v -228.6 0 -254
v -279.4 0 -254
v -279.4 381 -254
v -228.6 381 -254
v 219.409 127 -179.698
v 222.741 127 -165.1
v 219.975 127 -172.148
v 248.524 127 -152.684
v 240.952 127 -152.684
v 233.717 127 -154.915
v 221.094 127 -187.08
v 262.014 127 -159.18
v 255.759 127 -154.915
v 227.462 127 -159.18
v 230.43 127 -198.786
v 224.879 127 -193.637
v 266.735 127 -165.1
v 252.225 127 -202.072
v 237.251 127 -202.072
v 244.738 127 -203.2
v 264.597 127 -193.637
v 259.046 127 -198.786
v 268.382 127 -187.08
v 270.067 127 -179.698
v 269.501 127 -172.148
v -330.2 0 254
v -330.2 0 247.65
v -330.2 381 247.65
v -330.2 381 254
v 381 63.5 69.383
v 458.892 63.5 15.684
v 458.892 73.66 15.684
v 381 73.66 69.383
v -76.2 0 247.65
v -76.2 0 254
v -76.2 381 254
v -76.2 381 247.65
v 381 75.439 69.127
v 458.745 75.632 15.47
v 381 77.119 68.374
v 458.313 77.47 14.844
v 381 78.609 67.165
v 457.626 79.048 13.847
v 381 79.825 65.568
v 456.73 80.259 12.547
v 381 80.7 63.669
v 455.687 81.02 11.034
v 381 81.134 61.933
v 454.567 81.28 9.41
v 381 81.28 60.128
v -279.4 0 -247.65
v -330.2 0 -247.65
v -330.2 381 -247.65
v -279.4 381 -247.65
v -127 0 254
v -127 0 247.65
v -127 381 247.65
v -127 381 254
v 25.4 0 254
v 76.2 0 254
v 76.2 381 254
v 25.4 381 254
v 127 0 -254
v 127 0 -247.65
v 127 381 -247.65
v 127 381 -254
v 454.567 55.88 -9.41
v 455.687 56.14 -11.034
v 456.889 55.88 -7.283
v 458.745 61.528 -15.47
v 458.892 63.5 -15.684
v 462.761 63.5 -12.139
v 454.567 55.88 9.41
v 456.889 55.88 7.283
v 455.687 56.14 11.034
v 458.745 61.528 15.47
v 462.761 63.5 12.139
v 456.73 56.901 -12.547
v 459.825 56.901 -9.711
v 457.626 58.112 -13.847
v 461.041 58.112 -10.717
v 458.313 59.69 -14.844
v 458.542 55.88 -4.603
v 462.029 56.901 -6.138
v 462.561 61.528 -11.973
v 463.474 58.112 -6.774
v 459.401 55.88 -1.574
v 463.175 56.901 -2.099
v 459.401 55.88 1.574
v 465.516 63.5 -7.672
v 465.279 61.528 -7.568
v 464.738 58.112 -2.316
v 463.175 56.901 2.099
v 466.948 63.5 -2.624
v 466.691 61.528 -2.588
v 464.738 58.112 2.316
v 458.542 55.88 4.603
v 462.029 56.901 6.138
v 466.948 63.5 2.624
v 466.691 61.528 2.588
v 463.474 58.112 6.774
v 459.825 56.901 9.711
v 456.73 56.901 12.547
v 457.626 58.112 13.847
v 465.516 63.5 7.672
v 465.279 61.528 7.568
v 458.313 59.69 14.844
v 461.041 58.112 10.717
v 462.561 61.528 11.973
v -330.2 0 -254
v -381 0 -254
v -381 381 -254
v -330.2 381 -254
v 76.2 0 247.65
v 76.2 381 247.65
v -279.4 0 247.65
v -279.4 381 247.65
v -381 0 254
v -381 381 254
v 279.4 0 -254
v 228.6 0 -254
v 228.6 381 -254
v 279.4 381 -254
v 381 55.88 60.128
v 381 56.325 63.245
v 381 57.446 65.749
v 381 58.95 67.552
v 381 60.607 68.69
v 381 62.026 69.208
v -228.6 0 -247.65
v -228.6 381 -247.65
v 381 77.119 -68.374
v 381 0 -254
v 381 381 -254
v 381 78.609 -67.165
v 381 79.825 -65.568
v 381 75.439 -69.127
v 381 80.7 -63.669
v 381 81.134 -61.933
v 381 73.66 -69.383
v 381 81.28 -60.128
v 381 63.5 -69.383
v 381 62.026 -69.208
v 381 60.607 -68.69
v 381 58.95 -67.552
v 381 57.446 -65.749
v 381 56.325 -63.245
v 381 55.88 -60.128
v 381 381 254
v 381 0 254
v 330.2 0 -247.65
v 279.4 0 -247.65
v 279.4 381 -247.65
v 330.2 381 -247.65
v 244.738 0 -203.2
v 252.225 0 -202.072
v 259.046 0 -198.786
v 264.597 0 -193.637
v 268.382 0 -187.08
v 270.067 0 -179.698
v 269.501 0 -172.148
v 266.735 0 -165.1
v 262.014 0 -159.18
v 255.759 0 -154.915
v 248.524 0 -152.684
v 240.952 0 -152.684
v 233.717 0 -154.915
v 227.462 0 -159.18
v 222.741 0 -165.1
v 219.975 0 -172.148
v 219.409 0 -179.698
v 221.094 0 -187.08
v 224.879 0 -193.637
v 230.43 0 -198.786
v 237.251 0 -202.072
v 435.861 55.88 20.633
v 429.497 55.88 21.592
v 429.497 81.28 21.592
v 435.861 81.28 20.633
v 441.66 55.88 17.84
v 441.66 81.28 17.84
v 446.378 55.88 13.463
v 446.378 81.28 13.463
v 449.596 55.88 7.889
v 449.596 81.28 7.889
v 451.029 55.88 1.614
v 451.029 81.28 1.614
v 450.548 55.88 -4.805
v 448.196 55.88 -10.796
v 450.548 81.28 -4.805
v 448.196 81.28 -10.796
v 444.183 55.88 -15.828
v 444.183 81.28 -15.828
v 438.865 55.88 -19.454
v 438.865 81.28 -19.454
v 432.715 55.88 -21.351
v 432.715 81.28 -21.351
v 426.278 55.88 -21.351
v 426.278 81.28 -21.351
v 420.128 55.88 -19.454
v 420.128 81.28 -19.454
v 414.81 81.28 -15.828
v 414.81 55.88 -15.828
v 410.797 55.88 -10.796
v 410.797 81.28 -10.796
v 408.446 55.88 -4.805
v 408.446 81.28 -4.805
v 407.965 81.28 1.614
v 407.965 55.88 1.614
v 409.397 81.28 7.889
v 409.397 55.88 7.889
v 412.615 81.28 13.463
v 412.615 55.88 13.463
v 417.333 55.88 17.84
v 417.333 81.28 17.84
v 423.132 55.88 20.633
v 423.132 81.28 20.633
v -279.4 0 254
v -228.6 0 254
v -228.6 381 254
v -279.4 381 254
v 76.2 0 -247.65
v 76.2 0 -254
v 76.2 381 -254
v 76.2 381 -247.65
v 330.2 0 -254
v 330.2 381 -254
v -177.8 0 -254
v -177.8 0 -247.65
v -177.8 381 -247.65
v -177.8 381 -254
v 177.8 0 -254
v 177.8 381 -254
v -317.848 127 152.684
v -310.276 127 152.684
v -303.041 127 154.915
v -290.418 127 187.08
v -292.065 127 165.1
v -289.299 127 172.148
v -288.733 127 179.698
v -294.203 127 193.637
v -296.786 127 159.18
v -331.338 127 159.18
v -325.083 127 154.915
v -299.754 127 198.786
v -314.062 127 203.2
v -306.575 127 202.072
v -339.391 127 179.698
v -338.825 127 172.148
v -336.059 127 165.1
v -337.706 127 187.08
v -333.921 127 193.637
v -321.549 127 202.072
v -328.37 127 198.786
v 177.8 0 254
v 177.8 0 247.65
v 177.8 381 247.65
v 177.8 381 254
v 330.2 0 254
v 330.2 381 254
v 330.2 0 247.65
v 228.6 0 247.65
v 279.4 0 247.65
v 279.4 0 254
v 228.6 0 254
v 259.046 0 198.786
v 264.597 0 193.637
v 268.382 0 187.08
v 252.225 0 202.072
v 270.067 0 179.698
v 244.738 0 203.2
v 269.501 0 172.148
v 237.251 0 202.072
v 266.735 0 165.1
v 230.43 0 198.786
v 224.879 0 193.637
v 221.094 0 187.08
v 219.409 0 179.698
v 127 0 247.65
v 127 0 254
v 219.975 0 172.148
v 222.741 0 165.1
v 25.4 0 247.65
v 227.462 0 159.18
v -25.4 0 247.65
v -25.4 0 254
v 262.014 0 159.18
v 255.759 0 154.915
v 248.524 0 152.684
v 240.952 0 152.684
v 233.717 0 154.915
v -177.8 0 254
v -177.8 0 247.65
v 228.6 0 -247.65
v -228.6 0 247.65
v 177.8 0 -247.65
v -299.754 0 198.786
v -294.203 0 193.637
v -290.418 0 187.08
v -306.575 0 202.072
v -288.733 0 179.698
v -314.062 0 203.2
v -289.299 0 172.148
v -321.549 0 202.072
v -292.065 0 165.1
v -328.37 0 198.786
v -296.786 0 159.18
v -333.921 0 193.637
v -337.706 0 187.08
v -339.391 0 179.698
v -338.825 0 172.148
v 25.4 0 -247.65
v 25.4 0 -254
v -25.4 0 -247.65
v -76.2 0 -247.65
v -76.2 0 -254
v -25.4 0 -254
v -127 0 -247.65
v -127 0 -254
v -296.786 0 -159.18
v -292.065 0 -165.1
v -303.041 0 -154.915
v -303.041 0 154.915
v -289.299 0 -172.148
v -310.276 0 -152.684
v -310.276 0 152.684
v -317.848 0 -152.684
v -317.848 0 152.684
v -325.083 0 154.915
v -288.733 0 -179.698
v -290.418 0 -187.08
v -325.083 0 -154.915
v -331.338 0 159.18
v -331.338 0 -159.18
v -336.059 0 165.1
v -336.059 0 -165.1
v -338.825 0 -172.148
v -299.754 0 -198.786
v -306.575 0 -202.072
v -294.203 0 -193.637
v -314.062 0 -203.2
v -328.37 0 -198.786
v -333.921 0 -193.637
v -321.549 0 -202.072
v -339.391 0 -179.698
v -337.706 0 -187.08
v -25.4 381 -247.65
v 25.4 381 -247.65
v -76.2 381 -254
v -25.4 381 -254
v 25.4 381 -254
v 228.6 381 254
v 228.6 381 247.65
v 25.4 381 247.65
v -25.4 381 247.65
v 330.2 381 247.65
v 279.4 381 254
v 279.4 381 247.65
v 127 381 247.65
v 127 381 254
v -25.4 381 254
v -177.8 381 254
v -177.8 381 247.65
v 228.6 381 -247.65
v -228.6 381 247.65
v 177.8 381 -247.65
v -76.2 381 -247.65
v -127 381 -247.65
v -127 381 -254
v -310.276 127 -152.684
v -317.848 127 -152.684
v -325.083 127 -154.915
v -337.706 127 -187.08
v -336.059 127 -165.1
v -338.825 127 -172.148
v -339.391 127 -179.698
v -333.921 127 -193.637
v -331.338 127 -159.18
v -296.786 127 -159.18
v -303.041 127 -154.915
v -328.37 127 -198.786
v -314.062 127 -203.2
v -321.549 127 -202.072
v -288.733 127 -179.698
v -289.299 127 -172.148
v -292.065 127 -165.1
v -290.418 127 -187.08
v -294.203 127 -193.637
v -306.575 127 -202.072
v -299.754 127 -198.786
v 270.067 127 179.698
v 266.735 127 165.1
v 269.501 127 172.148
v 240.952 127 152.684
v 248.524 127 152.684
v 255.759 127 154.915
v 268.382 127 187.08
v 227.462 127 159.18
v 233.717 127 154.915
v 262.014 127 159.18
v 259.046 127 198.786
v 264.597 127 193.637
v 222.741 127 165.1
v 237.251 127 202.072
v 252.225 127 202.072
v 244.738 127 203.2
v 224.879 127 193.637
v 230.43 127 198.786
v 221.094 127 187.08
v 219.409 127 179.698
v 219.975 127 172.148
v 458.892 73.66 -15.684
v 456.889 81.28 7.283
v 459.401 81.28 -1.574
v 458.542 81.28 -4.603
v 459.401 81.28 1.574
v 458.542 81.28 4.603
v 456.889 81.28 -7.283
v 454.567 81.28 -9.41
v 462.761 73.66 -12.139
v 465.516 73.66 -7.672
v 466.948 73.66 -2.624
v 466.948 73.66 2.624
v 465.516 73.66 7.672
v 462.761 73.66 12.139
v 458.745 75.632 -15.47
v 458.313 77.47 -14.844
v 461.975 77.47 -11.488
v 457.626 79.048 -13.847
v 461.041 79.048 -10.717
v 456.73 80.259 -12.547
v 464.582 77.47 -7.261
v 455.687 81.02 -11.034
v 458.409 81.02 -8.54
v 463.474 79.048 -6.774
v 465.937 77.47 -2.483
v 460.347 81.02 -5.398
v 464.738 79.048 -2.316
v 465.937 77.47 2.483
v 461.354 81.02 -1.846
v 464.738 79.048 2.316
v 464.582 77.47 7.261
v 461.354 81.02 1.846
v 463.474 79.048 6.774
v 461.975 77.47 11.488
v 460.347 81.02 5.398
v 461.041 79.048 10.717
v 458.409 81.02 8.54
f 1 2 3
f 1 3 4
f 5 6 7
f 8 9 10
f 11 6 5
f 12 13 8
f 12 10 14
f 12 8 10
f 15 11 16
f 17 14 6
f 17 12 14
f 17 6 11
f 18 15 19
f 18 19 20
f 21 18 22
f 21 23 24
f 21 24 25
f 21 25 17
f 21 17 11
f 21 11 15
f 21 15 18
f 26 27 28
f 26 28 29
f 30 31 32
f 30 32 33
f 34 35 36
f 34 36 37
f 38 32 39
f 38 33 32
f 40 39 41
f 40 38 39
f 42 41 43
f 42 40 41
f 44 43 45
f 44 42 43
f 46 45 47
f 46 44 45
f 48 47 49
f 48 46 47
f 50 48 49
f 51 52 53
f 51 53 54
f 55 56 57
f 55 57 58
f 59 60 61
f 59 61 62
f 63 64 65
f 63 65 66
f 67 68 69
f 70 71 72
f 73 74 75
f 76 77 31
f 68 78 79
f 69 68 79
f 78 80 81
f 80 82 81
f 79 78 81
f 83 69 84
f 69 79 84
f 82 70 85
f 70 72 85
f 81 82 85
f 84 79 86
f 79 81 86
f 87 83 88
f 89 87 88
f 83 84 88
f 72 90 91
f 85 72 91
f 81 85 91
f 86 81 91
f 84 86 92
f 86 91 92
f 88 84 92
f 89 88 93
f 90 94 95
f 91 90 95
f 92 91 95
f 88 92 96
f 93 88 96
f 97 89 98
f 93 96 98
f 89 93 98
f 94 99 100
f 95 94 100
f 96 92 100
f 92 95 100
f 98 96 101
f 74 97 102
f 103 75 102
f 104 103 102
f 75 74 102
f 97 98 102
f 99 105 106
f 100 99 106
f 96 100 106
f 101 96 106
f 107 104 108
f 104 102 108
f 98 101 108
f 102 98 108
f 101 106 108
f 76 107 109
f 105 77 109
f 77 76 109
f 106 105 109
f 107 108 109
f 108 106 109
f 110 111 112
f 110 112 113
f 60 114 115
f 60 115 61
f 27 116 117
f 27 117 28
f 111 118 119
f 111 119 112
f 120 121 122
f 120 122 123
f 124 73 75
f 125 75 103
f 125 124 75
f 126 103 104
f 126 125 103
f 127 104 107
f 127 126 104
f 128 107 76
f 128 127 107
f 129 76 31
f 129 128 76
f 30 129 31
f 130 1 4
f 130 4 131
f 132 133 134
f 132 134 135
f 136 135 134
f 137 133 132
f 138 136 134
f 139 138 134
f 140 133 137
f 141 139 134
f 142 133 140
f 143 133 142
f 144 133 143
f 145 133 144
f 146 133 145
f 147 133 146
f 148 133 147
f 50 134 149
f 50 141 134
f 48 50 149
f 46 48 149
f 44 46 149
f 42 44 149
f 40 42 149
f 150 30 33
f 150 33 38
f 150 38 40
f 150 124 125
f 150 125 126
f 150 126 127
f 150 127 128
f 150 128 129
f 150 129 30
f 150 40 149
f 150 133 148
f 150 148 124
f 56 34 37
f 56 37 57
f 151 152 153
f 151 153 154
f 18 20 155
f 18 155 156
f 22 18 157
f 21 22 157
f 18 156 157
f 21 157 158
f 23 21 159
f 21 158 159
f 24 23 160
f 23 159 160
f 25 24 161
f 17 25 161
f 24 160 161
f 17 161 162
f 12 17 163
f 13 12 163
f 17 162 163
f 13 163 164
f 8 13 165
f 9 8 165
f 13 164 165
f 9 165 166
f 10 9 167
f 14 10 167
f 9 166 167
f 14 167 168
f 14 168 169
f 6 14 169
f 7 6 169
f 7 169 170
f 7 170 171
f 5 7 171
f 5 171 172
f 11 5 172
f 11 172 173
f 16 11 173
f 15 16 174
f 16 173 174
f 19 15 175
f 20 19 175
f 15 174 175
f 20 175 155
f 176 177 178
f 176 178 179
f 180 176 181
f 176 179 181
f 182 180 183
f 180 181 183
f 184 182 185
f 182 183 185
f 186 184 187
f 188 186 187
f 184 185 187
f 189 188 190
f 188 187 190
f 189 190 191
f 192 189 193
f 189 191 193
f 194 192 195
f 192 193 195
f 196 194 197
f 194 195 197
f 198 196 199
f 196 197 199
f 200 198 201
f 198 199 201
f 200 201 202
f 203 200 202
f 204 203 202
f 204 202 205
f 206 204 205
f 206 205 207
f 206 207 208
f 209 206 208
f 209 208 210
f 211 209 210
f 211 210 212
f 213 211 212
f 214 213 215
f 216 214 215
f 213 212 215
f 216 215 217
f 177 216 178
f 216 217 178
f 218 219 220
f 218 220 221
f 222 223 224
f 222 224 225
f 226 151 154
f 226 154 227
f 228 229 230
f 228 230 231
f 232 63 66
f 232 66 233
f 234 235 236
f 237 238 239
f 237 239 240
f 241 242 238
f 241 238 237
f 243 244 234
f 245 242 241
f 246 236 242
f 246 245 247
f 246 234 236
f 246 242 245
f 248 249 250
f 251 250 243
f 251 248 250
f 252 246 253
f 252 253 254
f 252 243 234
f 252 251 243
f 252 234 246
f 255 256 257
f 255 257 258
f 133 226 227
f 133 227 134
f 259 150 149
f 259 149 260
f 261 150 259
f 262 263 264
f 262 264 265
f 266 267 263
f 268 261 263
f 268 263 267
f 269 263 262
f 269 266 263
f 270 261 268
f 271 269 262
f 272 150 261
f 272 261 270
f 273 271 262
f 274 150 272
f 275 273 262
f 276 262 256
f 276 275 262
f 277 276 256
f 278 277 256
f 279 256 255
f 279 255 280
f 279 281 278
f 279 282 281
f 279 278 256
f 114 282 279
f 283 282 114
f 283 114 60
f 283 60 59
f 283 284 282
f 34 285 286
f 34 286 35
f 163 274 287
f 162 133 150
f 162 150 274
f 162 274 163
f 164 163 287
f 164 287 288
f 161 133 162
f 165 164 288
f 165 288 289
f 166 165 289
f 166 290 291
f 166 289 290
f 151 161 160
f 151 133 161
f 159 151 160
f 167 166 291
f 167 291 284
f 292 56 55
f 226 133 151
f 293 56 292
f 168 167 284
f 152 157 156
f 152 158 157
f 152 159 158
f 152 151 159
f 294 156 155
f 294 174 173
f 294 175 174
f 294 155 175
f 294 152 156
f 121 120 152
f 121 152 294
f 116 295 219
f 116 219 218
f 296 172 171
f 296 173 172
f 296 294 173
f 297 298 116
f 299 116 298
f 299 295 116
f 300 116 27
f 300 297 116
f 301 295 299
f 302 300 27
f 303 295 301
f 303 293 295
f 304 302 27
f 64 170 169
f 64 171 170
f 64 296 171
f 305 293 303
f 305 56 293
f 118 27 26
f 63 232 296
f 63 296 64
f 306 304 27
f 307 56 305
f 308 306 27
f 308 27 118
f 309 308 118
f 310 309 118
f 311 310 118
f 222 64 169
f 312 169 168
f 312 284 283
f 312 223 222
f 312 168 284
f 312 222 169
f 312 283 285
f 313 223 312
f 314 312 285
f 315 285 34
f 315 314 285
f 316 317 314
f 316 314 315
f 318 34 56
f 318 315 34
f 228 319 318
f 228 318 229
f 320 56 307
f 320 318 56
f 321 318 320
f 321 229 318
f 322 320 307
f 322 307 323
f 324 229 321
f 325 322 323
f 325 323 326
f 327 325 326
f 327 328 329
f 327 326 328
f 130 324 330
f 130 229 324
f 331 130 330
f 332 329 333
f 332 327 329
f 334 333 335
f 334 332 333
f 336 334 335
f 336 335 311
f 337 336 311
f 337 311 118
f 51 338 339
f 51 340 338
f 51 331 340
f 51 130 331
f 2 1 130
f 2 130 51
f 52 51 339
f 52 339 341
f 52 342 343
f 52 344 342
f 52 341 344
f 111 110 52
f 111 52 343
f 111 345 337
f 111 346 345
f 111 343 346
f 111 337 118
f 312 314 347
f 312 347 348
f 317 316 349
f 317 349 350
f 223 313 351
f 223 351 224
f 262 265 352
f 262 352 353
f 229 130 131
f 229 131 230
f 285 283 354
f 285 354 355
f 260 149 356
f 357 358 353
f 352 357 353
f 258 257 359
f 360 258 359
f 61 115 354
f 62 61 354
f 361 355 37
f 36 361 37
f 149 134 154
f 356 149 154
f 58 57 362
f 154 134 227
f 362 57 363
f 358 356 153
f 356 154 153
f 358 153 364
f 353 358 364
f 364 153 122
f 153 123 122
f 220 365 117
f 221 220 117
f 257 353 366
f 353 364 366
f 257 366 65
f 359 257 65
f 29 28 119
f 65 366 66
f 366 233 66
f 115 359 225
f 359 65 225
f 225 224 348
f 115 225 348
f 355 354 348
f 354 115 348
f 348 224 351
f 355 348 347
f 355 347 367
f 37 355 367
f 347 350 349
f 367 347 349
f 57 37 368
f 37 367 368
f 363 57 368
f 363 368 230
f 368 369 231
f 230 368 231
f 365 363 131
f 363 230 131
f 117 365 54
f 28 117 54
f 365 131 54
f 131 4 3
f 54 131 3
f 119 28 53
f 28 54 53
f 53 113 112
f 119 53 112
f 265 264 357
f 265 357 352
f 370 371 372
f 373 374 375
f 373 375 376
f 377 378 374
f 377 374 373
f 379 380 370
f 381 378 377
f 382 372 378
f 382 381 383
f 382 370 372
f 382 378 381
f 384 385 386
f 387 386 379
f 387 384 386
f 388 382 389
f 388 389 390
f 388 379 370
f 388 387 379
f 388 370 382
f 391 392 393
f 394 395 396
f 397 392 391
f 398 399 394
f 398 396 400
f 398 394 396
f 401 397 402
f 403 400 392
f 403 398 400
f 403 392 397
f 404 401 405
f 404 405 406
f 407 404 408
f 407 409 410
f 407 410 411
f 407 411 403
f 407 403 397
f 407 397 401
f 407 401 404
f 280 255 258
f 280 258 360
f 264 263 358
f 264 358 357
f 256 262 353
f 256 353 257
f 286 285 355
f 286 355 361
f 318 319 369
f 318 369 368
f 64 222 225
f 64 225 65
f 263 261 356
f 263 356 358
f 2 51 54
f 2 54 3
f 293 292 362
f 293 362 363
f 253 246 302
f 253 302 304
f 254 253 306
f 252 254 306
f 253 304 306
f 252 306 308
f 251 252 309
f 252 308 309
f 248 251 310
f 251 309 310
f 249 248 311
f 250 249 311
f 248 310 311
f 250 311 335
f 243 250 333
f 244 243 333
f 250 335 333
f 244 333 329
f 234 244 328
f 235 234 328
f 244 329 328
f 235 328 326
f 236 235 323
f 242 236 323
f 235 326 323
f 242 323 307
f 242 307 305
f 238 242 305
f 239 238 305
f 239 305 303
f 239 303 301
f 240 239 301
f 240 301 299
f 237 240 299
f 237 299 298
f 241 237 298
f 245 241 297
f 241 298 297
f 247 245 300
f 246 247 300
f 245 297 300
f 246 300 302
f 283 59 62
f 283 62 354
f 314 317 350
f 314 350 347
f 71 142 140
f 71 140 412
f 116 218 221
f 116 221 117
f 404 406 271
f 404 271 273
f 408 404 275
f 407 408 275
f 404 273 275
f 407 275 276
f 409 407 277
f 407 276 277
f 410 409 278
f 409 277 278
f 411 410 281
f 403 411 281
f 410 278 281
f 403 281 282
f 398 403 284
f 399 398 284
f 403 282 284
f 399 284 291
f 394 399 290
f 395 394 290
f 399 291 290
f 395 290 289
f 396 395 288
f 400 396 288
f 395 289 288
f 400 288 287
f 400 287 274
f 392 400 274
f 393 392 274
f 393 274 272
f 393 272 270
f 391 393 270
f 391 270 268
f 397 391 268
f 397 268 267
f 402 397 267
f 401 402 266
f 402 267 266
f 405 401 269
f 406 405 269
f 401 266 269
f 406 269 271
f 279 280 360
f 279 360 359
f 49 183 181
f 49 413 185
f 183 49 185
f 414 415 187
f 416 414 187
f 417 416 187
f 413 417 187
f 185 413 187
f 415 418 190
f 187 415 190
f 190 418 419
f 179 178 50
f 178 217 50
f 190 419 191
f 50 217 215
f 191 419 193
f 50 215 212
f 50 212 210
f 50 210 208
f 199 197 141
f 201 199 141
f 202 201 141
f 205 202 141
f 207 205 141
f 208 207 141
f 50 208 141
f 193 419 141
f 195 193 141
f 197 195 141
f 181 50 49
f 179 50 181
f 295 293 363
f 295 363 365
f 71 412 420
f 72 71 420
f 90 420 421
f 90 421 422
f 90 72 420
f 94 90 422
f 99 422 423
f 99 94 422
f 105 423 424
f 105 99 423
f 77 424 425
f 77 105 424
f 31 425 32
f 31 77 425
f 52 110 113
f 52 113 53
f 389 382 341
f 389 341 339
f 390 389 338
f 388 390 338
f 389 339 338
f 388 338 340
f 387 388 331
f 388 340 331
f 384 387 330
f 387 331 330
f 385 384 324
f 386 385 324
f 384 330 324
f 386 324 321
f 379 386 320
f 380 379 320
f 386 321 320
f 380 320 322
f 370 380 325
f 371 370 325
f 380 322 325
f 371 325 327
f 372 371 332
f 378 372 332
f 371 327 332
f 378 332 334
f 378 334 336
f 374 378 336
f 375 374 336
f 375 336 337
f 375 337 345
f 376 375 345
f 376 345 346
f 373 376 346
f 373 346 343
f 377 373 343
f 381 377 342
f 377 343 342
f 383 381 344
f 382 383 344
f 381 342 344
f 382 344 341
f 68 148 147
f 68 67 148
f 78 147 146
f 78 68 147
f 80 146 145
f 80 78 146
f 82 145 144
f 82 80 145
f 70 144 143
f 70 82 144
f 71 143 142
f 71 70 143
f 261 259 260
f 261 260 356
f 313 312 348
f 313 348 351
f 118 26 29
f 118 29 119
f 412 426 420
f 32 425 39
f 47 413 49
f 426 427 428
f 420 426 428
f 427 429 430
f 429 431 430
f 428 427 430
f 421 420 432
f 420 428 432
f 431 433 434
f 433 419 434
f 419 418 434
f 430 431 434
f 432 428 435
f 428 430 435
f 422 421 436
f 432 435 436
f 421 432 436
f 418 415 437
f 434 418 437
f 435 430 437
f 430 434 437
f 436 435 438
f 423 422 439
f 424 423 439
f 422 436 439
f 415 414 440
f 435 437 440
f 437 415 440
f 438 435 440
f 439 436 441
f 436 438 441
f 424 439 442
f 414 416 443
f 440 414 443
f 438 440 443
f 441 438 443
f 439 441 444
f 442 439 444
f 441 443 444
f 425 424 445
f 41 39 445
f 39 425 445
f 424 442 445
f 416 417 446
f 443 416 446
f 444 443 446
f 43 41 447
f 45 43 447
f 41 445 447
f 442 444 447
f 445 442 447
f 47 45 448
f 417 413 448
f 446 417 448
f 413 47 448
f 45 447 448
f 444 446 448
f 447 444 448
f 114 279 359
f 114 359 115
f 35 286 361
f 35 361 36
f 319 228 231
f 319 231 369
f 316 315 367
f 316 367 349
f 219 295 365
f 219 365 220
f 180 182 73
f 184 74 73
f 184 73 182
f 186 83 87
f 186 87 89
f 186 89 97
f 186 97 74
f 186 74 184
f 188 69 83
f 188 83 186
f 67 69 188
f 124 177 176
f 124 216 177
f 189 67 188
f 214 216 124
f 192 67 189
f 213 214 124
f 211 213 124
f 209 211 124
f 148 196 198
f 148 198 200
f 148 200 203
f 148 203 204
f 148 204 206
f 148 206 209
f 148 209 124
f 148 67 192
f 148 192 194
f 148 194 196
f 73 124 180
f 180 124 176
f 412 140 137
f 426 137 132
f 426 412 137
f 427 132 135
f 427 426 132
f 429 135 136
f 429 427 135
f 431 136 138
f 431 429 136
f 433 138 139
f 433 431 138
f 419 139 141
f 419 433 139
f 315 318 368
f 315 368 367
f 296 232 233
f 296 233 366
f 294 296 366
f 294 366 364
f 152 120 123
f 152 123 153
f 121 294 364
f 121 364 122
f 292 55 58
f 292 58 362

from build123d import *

# Parameters (mm, degrees)
BOSS_EXTRUDE1_DEPTH = 381
BOSS_EXTRUDE2_DEPTH = 12.7
SKETCH4_R           = 21.592305898
CUT_EXTRUDE1_DEPTH  = 25.4
FILLET1_R           = 7.62
SKETCH5_R           = 25.4
CUT_EXTRUDE2_DEPTH  = 127


with BuildPart() as part:
    # Sketch2 → Boss-Extrude1 (new body)
    with BuildSketch(Plane(origin=(0, 0, 0), x_dir=(1, 0, 0), z_dir=(0, 1, 0))):
        Polygon((-381, 254), (-330.2, 254), (-330.2, 247.65), (-279.4, 247.65), (-279.4, 254), (-228.6, 254), (-228.6, 247.65), (-177.8, 247.65), (-177.8, 254), (-127, 254), (-127, 247.65), (-76.2, 247.65), (-76.2, 254), (-25.4, 254), (-25.4, 247.65), (25.4, 247.65), (25.4, 254), (76.2, 254), (76.2, 247.65), (127, 247.65), (127, 254), (177.8, 254), (177.8, 247.65), (228.6, 247.65), (228.6, 254), (279.4, 254), (279.4, 247.65), (330.2, 247.65), (330.2, 254), (381, 254), (381, -254), (330.2, -254), (330.2, -247.65), (279.4, -247.65), (279.4, -254), (228.6, -254), (228.6, -247.65), (177.8, -247.65), (177.8, -254), (127, -254), (127, -247.65), (76.2, -247.65), (76.2, -254), (25.4, -254), (25.4, -247.65), (-25.4, -247.65), (-25.4, -254), (-76.2, -254), (-76.2, -247.65), (-127, -247.65), (-127, -254), (-177.8, -254), (-177.8, -247.65), (-228.6, -247.65), (-228.6, -254), (-279.4, -254), (-279.4, -247.65), (-330.2, -247.65), (-330.2, -254), (-381, -254), align=None)
    extrude(amount=BOSS_EXTRUDE1_DEPTH)

    # Sketch3 → Boss-Extrude2 (add, symmetric)
    with BuildSketch(Plane(origin=(0, 68.58, 0), x_dir=(-1, 0, 0), z_dir=(0, -1, 0))):
        with BuildLine():
            Line((-458.892414986, -15.684101321), (-381, -69.382839719))
            Line((-381, -69.382839719), (-381, 69.382839719))
            Line((-381, 69.382839719), (-458.892414986, 15.684101321))
            ThreePointArc((-458.892414986, 15.684101321), (-467.12985443, 0), (-458.892414986, -15.684101321))
        make_face()
    extrude(amount=BOSS_EXTRUDE2_DEPTH, both=True)

    # Sketch4 → Cut-Extrude1 (cut)
    with BuildSketch(Plane(origin=(0, 81.28, 0), x_dir=(1, 0, 0), z_dir=(0, 1, 0))):
        with Locations(Location((429.496611066, 0, 0), (0, 0, 270))):
            Circle(SKETCH4_R)
    extrude(amount=-CUT_EXTRUDE1_DEPTH, mode=Mode.SUBTRACT)

    # Fillet1
    fillet1_edges = [part.edges().sort_by_distance(p)[0] for p in [
        (419.946207493, 81.28, -42.53347052),
        (467.12985443, 81.28, 0),
        (419.946207493, 81.28, 42.53347052),
        (419.946207493, 55.88, -42.53347052),
        (467.12985443, 55.88, 0),
        (419.946207493, 55.88, 42.53347052),
    ]]
    fillet(fillet1_edges, radius=FILLET1_R)

    # Sketch5 → Cut-Extrude2 (cut)
    with BuildSketch(Plane.XZ):
        with Locations(Location((-314.062017965, -177.8, 0), (0, 0, 270))):
            Circle(SKETCH5_R)
        with Locations(Location((244.737982035, -177.8, 0), (0, 0, 270))):
            Circle(SKETCH5_R)
        with Locations(Location((244.737982035, 177.8, 0), (0, 0, 90))):
            Circle(SKETCH5_R)
        with Locations(Location((-314.062017965, 177.8, 0), (0, 0, 90))):
            Circle(SKETCH5_R)
    extrude(amount=-CUT_EXTRUDE2_DEPTH, mode=Mode.SUBTRACT)


solid = part.part
